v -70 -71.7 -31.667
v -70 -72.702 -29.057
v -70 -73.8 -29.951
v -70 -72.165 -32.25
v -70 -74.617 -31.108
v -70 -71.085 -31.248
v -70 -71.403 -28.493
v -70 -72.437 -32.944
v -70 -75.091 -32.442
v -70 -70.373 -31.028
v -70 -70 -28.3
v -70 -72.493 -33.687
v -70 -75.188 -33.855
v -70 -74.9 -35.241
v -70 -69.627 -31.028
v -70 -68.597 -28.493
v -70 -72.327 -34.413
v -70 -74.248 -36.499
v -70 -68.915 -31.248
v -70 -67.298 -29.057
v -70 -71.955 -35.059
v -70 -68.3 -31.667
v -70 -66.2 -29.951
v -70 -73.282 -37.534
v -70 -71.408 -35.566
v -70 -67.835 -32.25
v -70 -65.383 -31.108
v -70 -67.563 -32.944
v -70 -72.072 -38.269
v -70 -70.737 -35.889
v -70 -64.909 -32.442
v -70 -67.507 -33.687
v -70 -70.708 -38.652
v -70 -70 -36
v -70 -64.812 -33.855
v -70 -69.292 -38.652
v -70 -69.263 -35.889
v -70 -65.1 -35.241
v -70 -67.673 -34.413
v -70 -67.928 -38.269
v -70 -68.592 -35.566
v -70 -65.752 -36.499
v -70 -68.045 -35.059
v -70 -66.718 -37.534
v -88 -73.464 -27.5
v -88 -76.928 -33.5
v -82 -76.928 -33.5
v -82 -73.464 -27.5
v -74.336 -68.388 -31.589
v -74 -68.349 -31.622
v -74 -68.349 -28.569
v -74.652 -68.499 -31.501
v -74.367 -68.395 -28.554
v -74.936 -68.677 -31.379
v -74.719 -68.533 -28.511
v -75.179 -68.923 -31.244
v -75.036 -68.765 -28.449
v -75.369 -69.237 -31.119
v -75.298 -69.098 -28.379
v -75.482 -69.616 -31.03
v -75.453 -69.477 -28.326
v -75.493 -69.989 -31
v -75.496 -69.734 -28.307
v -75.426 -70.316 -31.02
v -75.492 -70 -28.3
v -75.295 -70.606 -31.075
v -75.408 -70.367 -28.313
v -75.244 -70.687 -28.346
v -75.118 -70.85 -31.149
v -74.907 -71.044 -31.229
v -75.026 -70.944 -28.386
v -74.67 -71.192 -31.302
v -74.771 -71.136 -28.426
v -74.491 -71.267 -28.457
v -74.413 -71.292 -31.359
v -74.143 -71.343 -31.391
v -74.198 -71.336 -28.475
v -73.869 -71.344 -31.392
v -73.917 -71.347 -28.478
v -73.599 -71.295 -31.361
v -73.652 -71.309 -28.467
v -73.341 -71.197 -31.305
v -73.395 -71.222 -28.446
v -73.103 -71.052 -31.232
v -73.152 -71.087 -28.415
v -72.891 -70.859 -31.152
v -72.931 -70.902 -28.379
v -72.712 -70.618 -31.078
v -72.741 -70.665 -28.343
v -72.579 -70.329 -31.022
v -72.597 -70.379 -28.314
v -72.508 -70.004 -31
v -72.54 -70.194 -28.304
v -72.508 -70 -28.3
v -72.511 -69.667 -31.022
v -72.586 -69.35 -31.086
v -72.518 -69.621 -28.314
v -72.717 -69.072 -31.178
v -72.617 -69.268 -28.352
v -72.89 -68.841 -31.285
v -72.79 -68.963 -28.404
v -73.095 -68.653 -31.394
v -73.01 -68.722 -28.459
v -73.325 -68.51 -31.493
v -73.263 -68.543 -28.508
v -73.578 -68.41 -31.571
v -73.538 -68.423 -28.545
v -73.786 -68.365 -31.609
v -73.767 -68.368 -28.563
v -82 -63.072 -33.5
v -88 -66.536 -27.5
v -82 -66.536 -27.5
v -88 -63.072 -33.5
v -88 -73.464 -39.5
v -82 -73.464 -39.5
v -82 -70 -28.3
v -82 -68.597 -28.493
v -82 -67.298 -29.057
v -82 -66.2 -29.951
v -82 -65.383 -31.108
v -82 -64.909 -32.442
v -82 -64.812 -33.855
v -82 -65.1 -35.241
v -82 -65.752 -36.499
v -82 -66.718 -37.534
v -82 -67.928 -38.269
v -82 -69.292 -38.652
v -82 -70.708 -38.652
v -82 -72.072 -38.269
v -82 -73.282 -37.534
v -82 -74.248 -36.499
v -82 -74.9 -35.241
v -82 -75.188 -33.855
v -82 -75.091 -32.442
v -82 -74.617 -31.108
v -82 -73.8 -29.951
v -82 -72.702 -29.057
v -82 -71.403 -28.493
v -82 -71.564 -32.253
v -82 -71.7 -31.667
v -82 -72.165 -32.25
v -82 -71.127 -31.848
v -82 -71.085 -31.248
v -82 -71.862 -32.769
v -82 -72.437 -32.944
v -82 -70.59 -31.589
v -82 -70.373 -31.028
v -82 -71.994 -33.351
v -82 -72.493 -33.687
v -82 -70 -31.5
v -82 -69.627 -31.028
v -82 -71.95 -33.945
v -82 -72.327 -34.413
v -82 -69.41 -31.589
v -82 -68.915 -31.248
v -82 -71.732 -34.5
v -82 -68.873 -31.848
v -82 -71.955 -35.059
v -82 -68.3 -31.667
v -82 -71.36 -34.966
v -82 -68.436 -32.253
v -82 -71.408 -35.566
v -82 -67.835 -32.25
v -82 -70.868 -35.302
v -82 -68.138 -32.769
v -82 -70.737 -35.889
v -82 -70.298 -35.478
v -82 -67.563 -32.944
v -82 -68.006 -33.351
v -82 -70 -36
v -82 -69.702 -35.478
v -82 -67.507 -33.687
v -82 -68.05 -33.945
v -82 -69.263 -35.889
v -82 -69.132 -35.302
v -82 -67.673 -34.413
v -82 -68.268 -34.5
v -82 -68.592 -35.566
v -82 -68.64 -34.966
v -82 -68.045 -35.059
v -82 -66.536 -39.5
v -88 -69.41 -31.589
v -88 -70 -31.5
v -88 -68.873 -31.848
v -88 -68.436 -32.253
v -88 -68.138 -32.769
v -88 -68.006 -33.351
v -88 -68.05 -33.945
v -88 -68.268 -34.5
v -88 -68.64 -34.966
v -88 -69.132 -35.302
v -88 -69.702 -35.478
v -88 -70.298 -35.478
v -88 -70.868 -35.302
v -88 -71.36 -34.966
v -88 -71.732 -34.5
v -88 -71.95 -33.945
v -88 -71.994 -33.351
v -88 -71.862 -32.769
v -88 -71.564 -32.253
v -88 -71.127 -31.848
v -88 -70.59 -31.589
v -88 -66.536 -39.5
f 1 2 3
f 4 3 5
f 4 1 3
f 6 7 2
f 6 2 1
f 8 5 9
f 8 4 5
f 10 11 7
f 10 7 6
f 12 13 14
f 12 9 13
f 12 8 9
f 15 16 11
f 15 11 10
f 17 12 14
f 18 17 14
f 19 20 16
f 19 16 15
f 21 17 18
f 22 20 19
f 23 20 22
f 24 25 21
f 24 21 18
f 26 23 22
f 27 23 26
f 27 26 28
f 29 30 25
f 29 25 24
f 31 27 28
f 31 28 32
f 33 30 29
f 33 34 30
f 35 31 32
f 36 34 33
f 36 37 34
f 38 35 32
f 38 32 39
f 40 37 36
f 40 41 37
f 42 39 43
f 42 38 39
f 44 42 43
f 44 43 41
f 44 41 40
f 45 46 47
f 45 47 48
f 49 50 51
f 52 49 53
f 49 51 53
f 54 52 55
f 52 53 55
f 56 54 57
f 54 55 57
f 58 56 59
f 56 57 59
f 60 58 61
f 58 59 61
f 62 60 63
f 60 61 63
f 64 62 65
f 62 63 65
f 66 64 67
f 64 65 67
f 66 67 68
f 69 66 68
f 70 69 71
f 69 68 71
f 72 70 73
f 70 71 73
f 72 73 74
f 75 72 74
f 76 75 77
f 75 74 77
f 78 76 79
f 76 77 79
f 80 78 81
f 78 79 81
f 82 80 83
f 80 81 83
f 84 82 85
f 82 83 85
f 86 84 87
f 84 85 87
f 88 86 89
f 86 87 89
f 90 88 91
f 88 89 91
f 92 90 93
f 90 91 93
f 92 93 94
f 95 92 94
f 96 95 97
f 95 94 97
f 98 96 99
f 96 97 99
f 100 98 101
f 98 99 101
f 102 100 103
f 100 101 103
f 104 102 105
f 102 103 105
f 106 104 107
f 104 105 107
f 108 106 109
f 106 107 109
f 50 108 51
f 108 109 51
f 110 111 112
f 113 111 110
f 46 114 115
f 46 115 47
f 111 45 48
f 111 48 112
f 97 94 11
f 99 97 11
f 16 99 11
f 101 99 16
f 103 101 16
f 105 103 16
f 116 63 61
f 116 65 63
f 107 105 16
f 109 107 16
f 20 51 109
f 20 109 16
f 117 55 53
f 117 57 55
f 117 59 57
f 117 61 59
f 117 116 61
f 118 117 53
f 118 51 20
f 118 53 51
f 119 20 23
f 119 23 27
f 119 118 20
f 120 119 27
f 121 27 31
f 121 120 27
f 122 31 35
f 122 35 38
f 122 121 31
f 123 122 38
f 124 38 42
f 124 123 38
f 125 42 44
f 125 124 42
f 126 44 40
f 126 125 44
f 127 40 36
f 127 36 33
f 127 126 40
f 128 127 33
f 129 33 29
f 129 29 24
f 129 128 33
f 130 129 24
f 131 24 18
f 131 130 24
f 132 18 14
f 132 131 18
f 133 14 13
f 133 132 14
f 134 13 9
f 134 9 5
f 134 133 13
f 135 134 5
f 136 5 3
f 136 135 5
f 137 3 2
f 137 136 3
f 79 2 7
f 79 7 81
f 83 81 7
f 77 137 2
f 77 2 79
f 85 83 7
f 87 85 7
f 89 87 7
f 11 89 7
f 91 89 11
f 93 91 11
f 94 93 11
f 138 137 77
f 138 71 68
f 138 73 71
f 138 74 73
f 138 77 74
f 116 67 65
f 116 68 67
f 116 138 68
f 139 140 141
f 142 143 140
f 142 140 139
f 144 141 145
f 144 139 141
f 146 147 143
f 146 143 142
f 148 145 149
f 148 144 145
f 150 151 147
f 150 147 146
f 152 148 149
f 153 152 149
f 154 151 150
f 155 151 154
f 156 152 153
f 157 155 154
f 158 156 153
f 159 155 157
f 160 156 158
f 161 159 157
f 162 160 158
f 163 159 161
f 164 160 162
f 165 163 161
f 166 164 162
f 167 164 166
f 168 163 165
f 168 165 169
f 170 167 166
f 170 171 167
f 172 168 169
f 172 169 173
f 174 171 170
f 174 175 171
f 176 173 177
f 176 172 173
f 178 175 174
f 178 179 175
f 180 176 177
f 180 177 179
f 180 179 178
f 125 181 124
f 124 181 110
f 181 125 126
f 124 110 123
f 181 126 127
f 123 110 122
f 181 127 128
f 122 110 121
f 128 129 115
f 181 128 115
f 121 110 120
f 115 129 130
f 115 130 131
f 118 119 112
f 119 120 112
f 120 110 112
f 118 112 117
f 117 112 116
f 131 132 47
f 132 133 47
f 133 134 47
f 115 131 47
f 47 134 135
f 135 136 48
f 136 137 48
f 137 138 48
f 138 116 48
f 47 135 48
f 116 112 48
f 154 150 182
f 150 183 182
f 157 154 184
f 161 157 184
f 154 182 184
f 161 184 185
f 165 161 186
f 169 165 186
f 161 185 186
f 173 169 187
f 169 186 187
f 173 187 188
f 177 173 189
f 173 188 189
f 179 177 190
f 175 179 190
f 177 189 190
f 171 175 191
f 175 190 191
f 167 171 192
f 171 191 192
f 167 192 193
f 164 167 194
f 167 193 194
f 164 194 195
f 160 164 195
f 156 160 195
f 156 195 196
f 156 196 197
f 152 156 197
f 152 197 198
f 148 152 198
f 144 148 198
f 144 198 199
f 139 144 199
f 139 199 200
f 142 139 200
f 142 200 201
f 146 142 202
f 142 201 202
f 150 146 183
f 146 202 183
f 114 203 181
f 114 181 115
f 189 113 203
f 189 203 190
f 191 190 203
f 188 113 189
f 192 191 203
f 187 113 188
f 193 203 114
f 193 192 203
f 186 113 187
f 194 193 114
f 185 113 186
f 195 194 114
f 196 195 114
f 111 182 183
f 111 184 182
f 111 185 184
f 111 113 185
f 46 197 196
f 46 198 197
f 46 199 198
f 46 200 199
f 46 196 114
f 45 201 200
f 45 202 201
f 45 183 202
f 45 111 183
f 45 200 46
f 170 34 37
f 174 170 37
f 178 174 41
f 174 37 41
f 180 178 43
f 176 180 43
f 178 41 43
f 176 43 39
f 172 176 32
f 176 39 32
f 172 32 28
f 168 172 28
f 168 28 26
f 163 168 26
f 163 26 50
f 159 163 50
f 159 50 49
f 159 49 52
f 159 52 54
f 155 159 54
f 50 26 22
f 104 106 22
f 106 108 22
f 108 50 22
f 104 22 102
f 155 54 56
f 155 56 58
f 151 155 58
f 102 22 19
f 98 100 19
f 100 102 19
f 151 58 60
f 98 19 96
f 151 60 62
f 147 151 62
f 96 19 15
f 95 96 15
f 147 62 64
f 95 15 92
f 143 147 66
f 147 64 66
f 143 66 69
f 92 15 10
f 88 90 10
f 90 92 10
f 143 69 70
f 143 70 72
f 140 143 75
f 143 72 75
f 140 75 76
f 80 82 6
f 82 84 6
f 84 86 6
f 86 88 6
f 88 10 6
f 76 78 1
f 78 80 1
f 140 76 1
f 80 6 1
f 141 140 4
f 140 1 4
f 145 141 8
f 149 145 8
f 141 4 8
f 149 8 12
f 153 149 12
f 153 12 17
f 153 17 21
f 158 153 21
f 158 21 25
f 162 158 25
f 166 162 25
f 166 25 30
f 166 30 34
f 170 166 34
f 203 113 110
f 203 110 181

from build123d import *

# Parameters (mm, degrees)
EXTRUDE_1_DEPTH                = 6
SKETCH_2_W                     = 12
SKETCH_2_H                     = 5.2
HOLE_WIZARD_M3_5_1_D           = 4
HOLE_WIZARD_M3_5_1_CBORE_D     = 5
HOLE_WIZARD_M3_5_1_CBORE_DEPTH = 12
SKETCH_5_W                     = 1.5
SKETCH_5_H                     = 4.122312264


with BuildPart() as part:
    # 草图1 → 凸台-拉伸1 (new body)
    with BuildSketch(Plane(origin=(-88, 0, 0), x_dir=(0, -1, 0), z_dir=(-1, 0, 0))):
        Polygon((76.92820323, -33.5), (73.464101615, -27.5), (66.535898385, -27.5), (63.07179677, -33.5), (66.535898385, -39.5), (73.464101615, -39.5), align=None)
    extrude(amount=-EXTRUDE_1_DEPTH)

    # 草图2 → 旋转1 (revolve)
    with BuildSketch(Plane(origin=(0, 0, -33.5), x_dir=(-1, 0, 0), z_dir=(0, 0, -1)), mode=Mode.PRIVATE) as revolve_1_sk:
        with Locations((76, -67.4)):
            Rectangle(SKETCH_2_W, SKETCH_2_H)
    revolve(revolve_1_sk.sketch.rotate(Axis((-70, -70, -33.5), (-1, 0, 0)), 270), axis=Axis((-70, -70, -33.5), (-1, 0, 0)))

    # M3.5 六角头机械螺钉的柱形沉头孔1 (through all)
    with Locations(Plane(origin=(-70, 0, 0), x_dir=(0, 0, -1), z_dir=(1, 0, 0))):
        with Locations((33.5, -70)):
            CounterBoreHole(HOLE_WIZARD_M3_5_1_D / 2, HOLE_WIZARD_M3_5_1_CBORE_D / 2, HOLE_WIZARD_M3_5_1_CBORE_DEPTH)

    # 草图5 → Ø3.0 (3) 直径孔1 (revolve, cut)
    with BuildSketch(Plane(origin=(-74, -69.849458039, -31.622312264), x_dir=(0, 1, 0), z_dir=(1, 0, 0))):
        with Locations((0.75, 2.061156132)):
            Rectangle(SKETCH_5_W, SKETCH_5_H)
    revolve(axis=Axis((-74, -69.849458039, -37.972312264), (0, 0, 1)), mode=Mode.SUBTRACT)


solid = part.part
